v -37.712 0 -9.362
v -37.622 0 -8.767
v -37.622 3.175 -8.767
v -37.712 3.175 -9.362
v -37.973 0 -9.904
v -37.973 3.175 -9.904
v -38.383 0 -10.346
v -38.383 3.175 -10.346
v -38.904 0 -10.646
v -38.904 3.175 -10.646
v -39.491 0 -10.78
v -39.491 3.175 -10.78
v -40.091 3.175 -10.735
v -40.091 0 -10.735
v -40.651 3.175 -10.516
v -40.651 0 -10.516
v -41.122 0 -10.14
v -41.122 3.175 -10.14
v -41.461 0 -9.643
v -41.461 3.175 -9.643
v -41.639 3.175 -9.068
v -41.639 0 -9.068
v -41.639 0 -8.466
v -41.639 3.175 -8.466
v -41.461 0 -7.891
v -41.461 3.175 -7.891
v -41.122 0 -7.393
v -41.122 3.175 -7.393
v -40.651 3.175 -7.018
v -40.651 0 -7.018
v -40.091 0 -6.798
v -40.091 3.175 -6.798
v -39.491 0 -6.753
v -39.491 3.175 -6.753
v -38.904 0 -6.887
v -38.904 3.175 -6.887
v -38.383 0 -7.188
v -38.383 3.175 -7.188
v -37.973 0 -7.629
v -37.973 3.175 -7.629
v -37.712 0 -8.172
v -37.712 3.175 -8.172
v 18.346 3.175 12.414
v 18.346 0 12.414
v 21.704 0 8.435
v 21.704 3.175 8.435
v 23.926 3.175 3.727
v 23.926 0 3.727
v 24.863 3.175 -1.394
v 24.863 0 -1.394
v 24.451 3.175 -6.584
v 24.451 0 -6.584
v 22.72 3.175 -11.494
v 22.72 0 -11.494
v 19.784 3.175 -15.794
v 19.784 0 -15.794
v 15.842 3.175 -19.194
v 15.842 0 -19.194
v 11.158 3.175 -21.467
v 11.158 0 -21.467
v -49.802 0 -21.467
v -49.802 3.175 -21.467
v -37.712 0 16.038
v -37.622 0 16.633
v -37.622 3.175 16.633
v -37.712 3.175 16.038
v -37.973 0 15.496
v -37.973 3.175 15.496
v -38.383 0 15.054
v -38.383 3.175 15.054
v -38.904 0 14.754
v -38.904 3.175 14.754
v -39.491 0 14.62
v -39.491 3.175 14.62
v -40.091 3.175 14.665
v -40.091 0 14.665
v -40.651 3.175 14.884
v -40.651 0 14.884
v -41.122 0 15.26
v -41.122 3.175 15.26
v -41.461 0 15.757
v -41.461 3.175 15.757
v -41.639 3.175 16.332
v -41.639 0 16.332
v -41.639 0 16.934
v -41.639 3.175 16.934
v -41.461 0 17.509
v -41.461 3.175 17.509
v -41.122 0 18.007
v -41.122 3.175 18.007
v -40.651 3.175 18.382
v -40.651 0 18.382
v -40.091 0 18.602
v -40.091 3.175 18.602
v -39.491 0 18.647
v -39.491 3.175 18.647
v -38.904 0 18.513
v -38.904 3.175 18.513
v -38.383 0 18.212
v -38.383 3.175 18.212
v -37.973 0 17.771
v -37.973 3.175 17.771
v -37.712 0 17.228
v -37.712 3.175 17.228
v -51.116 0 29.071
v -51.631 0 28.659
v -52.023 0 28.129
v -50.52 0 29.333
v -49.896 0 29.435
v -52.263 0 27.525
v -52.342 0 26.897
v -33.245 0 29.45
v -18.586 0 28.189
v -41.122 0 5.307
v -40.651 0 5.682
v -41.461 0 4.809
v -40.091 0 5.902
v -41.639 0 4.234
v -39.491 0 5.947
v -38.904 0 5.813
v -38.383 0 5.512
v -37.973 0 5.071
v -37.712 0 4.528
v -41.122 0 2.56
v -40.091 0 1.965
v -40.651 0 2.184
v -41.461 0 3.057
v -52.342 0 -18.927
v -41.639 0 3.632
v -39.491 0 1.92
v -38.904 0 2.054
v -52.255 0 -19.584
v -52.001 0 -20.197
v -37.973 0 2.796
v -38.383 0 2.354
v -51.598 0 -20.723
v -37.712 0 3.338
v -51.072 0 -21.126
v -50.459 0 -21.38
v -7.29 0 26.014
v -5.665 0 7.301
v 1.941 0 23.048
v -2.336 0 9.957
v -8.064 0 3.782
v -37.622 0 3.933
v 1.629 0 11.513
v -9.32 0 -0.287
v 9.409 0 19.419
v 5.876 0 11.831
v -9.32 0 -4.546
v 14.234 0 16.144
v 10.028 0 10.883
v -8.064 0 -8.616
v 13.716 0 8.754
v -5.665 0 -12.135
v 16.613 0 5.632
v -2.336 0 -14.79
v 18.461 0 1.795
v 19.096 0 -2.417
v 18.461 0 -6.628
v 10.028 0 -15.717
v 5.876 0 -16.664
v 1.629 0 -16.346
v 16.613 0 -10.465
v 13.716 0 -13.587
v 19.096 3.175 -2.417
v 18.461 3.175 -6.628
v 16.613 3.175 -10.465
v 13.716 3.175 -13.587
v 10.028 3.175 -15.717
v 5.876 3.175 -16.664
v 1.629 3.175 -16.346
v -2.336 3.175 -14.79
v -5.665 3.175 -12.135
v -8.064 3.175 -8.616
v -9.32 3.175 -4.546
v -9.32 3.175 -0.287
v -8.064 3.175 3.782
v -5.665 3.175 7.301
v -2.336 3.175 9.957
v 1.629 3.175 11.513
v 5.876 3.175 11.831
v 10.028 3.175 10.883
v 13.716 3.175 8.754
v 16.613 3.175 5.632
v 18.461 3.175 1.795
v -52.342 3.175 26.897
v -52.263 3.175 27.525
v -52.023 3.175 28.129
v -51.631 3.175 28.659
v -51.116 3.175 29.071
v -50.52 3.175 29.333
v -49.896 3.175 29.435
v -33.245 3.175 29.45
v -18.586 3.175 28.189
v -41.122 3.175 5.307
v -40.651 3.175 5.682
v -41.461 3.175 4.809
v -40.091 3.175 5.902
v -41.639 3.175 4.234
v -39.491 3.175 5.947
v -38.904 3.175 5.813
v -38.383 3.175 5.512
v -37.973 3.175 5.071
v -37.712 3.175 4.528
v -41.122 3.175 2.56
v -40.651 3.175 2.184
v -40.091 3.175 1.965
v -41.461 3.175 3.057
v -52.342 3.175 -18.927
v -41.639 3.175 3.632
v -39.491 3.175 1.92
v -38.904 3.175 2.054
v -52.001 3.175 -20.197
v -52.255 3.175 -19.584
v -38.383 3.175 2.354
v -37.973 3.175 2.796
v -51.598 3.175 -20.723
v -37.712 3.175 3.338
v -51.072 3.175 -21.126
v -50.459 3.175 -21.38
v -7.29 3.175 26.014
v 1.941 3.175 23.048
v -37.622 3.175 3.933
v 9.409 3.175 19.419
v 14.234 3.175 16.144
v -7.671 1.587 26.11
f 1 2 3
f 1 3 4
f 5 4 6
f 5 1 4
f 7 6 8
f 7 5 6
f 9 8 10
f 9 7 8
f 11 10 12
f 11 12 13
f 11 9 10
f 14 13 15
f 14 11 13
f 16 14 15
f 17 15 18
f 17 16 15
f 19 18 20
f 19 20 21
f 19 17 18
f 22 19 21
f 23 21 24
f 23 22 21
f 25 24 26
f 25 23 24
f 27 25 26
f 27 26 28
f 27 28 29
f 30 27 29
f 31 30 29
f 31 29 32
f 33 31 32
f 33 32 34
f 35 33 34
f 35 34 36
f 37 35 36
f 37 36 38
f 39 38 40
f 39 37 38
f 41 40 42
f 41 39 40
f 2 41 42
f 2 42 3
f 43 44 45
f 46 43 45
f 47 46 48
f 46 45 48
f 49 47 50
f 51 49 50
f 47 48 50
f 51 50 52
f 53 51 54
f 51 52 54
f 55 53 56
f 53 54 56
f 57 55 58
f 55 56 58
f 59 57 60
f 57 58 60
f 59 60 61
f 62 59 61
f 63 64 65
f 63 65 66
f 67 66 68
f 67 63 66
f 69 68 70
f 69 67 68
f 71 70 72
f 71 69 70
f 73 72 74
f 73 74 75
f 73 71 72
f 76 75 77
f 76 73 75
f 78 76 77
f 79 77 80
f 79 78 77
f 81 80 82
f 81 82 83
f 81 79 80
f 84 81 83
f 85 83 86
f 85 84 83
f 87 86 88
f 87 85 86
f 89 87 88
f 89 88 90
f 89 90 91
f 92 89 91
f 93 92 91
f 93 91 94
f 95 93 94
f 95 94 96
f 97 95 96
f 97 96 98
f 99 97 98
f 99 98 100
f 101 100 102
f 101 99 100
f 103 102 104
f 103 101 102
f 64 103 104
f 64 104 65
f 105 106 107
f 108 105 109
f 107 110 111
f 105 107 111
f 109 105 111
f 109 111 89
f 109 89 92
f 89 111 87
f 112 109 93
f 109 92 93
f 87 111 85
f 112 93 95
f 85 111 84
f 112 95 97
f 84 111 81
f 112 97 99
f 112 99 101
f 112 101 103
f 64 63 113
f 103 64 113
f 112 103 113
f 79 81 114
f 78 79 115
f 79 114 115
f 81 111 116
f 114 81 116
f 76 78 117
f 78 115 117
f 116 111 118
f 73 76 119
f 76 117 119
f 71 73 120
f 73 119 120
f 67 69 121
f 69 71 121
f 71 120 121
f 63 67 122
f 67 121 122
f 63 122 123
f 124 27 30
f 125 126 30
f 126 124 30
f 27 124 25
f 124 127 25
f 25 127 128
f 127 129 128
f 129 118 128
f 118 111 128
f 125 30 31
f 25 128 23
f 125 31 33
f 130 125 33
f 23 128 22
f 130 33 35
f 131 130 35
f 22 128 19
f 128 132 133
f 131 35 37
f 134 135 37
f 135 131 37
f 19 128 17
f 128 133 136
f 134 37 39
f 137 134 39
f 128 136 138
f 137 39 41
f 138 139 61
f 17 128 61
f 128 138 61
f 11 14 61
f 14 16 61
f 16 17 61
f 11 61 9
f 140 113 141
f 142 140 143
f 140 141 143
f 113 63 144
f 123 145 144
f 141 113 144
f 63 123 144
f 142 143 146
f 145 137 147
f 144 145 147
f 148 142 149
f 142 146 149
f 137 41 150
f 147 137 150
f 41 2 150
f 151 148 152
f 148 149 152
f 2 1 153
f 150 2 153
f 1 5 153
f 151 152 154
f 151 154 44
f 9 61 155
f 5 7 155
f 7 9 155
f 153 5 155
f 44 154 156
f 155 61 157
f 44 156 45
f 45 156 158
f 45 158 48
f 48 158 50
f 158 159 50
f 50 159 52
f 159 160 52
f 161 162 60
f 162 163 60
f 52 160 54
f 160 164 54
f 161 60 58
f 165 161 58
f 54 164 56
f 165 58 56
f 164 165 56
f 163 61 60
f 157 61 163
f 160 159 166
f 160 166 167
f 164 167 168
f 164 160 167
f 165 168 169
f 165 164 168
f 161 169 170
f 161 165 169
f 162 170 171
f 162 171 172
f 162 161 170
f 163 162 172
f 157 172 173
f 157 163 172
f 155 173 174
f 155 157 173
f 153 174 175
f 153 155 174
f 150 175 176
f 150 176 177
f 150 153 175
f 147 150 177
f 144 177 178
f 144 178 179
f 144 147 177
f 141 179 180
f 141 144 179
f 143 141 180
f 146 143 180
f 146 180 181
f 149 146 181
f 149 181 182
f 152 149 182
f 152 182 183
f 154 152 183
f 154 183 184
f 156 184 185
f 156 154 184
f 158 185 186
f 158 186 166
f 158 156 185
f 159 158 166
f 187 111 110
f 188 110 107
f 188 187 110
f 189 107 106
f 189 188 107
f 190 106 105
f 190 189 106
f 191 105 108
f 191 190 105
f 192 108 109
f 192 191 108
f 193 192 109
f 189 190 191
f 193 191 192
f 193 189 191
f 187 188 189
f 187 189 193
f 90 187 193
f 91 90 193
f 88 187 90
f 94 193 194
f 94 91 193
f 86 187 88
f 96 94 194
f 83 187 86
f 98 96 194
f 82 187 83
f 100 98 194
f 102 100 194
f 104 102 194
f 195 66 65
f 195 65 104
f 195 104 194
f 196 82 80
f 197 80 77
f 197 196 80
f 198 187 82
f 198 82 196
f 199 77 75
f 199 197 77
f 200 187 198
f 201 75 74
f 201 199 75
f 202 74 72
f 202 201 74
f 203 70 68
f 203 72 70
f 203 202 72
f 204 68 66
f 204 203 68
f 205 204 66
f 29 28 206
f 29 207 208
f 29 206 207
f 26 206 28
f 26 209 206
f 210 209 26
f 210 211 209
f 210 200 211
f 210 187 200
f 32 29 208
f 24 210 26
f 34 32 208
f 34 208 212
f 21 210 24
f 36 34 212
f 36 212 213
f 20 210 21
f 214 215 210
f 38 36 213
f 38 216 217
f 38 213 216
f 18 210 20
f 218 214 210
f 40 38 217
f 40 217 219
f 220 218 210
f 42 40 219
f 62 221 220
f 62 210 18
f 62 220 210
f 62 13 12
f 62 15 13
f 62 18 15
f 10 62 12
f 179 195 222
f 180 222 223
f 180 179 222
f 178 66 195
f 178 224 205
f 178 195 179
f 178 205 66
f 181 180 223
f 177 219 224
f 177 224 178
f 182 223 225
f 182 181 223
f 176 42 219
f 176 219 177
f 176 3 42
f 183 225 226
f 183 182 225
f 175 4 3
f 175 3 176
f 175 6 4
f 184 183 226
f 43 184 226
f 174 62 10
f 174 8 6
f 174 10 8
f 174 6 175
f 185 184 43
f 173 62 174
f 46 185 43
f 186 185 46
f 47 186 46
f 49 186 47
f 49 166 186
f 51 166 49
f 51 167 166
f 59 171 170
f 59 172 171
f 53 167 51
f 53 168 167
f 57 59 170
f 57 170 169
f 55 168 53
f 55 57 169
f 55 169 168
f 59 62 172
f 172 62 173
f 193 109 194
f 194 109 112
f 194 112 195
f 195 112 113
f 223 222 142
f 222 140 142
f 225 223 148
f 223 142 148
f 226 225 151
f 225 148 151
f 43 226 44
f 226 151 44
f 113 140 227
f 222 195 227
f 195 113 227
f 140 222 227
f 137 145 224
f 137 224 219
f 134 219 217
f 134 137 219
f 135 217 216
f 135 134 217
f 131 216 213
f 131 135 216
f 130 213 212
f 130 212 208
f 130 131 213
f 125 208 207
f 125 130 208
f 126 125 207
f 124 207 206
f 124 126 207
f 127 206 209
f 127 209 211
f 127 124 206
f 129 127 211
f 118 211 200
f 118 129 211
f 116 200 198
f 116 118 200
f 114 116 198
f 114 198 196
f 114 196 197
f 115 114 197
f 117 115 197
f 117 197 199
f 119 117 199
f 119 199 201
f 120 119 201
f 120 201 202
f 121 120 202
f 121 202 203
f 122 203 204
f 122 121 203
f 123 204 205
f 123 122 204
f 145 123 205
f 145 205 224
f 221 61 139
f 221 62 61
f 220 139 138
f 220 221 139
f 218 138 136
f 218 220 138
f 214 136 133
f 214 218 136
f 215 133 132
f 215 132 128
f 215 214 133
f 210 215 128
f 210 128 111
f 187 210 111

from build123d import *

# Parameters (mm, degrees)
SKETCH1_R           = 2.0193
SKETCH1_R_2         = 14.2875
BOSS_EXTRUDE1_DEPTH = 3.175
FILLET1_R           = 2.54


with BuildPart() as part:
    # Sketch1 → Boss-Extrude1 (new body)
    with BuildSketch(Plane(origin=(0, 0, 0), x_dir=(1, 0, 0), z_dir=(0, 1, 0))):
        with BuildLine():
            Line((11.158213086, 21.466758583), (-52.341786914, 21.466758583))
            Line((-52.341786914, 21.466758583), (-52.341786914, -29.333241417))
            add(Edge.make_bspline(
                [(-52.341786914, -29.333241417), (0, -31.75), (18.346437912, -12.413665165)],
                knots=[0, 0, 0, 1, 1, 1], degree=2))
            ThreePointArc((18.346437912, -12.413665165), (24.451434564, 6.58435381), (11.158213086, 21.466758583))
        make_face()
        with Locations((-39.641786914, -16.633241417)):
            Circle(SKETCH1_R, mode=Mode.SUBTRACT)
        with Locations((-39.641786914, -3.933241417)):
            Circle(SKETCH1_R, mode=Mode.SUBTRACT)
        with Locations((-39.641786914, 8.766758583)):
            Circle(SKETCH1_R, mode=Mode.SUBTRACT)
        with Locations((4.808213086, 2.416758583)):
            Circle(SKETCH1_R_2, mode=Mode.SUBTRACT)
    extrude(amount=BOSS_EXTRUDE1_DEPTH)

    # Fillet1
    fillet1_edges = [part.edges().sort_by_distance(p)[0] for p in [
        (-52.341786914, 1.5875, -21.466758583),
        (-52.341786914, 1.5875, 29.333241417),
    ]]
    fillet(fillet1_edges, radius=FILLET1_R)


solid = part.part
